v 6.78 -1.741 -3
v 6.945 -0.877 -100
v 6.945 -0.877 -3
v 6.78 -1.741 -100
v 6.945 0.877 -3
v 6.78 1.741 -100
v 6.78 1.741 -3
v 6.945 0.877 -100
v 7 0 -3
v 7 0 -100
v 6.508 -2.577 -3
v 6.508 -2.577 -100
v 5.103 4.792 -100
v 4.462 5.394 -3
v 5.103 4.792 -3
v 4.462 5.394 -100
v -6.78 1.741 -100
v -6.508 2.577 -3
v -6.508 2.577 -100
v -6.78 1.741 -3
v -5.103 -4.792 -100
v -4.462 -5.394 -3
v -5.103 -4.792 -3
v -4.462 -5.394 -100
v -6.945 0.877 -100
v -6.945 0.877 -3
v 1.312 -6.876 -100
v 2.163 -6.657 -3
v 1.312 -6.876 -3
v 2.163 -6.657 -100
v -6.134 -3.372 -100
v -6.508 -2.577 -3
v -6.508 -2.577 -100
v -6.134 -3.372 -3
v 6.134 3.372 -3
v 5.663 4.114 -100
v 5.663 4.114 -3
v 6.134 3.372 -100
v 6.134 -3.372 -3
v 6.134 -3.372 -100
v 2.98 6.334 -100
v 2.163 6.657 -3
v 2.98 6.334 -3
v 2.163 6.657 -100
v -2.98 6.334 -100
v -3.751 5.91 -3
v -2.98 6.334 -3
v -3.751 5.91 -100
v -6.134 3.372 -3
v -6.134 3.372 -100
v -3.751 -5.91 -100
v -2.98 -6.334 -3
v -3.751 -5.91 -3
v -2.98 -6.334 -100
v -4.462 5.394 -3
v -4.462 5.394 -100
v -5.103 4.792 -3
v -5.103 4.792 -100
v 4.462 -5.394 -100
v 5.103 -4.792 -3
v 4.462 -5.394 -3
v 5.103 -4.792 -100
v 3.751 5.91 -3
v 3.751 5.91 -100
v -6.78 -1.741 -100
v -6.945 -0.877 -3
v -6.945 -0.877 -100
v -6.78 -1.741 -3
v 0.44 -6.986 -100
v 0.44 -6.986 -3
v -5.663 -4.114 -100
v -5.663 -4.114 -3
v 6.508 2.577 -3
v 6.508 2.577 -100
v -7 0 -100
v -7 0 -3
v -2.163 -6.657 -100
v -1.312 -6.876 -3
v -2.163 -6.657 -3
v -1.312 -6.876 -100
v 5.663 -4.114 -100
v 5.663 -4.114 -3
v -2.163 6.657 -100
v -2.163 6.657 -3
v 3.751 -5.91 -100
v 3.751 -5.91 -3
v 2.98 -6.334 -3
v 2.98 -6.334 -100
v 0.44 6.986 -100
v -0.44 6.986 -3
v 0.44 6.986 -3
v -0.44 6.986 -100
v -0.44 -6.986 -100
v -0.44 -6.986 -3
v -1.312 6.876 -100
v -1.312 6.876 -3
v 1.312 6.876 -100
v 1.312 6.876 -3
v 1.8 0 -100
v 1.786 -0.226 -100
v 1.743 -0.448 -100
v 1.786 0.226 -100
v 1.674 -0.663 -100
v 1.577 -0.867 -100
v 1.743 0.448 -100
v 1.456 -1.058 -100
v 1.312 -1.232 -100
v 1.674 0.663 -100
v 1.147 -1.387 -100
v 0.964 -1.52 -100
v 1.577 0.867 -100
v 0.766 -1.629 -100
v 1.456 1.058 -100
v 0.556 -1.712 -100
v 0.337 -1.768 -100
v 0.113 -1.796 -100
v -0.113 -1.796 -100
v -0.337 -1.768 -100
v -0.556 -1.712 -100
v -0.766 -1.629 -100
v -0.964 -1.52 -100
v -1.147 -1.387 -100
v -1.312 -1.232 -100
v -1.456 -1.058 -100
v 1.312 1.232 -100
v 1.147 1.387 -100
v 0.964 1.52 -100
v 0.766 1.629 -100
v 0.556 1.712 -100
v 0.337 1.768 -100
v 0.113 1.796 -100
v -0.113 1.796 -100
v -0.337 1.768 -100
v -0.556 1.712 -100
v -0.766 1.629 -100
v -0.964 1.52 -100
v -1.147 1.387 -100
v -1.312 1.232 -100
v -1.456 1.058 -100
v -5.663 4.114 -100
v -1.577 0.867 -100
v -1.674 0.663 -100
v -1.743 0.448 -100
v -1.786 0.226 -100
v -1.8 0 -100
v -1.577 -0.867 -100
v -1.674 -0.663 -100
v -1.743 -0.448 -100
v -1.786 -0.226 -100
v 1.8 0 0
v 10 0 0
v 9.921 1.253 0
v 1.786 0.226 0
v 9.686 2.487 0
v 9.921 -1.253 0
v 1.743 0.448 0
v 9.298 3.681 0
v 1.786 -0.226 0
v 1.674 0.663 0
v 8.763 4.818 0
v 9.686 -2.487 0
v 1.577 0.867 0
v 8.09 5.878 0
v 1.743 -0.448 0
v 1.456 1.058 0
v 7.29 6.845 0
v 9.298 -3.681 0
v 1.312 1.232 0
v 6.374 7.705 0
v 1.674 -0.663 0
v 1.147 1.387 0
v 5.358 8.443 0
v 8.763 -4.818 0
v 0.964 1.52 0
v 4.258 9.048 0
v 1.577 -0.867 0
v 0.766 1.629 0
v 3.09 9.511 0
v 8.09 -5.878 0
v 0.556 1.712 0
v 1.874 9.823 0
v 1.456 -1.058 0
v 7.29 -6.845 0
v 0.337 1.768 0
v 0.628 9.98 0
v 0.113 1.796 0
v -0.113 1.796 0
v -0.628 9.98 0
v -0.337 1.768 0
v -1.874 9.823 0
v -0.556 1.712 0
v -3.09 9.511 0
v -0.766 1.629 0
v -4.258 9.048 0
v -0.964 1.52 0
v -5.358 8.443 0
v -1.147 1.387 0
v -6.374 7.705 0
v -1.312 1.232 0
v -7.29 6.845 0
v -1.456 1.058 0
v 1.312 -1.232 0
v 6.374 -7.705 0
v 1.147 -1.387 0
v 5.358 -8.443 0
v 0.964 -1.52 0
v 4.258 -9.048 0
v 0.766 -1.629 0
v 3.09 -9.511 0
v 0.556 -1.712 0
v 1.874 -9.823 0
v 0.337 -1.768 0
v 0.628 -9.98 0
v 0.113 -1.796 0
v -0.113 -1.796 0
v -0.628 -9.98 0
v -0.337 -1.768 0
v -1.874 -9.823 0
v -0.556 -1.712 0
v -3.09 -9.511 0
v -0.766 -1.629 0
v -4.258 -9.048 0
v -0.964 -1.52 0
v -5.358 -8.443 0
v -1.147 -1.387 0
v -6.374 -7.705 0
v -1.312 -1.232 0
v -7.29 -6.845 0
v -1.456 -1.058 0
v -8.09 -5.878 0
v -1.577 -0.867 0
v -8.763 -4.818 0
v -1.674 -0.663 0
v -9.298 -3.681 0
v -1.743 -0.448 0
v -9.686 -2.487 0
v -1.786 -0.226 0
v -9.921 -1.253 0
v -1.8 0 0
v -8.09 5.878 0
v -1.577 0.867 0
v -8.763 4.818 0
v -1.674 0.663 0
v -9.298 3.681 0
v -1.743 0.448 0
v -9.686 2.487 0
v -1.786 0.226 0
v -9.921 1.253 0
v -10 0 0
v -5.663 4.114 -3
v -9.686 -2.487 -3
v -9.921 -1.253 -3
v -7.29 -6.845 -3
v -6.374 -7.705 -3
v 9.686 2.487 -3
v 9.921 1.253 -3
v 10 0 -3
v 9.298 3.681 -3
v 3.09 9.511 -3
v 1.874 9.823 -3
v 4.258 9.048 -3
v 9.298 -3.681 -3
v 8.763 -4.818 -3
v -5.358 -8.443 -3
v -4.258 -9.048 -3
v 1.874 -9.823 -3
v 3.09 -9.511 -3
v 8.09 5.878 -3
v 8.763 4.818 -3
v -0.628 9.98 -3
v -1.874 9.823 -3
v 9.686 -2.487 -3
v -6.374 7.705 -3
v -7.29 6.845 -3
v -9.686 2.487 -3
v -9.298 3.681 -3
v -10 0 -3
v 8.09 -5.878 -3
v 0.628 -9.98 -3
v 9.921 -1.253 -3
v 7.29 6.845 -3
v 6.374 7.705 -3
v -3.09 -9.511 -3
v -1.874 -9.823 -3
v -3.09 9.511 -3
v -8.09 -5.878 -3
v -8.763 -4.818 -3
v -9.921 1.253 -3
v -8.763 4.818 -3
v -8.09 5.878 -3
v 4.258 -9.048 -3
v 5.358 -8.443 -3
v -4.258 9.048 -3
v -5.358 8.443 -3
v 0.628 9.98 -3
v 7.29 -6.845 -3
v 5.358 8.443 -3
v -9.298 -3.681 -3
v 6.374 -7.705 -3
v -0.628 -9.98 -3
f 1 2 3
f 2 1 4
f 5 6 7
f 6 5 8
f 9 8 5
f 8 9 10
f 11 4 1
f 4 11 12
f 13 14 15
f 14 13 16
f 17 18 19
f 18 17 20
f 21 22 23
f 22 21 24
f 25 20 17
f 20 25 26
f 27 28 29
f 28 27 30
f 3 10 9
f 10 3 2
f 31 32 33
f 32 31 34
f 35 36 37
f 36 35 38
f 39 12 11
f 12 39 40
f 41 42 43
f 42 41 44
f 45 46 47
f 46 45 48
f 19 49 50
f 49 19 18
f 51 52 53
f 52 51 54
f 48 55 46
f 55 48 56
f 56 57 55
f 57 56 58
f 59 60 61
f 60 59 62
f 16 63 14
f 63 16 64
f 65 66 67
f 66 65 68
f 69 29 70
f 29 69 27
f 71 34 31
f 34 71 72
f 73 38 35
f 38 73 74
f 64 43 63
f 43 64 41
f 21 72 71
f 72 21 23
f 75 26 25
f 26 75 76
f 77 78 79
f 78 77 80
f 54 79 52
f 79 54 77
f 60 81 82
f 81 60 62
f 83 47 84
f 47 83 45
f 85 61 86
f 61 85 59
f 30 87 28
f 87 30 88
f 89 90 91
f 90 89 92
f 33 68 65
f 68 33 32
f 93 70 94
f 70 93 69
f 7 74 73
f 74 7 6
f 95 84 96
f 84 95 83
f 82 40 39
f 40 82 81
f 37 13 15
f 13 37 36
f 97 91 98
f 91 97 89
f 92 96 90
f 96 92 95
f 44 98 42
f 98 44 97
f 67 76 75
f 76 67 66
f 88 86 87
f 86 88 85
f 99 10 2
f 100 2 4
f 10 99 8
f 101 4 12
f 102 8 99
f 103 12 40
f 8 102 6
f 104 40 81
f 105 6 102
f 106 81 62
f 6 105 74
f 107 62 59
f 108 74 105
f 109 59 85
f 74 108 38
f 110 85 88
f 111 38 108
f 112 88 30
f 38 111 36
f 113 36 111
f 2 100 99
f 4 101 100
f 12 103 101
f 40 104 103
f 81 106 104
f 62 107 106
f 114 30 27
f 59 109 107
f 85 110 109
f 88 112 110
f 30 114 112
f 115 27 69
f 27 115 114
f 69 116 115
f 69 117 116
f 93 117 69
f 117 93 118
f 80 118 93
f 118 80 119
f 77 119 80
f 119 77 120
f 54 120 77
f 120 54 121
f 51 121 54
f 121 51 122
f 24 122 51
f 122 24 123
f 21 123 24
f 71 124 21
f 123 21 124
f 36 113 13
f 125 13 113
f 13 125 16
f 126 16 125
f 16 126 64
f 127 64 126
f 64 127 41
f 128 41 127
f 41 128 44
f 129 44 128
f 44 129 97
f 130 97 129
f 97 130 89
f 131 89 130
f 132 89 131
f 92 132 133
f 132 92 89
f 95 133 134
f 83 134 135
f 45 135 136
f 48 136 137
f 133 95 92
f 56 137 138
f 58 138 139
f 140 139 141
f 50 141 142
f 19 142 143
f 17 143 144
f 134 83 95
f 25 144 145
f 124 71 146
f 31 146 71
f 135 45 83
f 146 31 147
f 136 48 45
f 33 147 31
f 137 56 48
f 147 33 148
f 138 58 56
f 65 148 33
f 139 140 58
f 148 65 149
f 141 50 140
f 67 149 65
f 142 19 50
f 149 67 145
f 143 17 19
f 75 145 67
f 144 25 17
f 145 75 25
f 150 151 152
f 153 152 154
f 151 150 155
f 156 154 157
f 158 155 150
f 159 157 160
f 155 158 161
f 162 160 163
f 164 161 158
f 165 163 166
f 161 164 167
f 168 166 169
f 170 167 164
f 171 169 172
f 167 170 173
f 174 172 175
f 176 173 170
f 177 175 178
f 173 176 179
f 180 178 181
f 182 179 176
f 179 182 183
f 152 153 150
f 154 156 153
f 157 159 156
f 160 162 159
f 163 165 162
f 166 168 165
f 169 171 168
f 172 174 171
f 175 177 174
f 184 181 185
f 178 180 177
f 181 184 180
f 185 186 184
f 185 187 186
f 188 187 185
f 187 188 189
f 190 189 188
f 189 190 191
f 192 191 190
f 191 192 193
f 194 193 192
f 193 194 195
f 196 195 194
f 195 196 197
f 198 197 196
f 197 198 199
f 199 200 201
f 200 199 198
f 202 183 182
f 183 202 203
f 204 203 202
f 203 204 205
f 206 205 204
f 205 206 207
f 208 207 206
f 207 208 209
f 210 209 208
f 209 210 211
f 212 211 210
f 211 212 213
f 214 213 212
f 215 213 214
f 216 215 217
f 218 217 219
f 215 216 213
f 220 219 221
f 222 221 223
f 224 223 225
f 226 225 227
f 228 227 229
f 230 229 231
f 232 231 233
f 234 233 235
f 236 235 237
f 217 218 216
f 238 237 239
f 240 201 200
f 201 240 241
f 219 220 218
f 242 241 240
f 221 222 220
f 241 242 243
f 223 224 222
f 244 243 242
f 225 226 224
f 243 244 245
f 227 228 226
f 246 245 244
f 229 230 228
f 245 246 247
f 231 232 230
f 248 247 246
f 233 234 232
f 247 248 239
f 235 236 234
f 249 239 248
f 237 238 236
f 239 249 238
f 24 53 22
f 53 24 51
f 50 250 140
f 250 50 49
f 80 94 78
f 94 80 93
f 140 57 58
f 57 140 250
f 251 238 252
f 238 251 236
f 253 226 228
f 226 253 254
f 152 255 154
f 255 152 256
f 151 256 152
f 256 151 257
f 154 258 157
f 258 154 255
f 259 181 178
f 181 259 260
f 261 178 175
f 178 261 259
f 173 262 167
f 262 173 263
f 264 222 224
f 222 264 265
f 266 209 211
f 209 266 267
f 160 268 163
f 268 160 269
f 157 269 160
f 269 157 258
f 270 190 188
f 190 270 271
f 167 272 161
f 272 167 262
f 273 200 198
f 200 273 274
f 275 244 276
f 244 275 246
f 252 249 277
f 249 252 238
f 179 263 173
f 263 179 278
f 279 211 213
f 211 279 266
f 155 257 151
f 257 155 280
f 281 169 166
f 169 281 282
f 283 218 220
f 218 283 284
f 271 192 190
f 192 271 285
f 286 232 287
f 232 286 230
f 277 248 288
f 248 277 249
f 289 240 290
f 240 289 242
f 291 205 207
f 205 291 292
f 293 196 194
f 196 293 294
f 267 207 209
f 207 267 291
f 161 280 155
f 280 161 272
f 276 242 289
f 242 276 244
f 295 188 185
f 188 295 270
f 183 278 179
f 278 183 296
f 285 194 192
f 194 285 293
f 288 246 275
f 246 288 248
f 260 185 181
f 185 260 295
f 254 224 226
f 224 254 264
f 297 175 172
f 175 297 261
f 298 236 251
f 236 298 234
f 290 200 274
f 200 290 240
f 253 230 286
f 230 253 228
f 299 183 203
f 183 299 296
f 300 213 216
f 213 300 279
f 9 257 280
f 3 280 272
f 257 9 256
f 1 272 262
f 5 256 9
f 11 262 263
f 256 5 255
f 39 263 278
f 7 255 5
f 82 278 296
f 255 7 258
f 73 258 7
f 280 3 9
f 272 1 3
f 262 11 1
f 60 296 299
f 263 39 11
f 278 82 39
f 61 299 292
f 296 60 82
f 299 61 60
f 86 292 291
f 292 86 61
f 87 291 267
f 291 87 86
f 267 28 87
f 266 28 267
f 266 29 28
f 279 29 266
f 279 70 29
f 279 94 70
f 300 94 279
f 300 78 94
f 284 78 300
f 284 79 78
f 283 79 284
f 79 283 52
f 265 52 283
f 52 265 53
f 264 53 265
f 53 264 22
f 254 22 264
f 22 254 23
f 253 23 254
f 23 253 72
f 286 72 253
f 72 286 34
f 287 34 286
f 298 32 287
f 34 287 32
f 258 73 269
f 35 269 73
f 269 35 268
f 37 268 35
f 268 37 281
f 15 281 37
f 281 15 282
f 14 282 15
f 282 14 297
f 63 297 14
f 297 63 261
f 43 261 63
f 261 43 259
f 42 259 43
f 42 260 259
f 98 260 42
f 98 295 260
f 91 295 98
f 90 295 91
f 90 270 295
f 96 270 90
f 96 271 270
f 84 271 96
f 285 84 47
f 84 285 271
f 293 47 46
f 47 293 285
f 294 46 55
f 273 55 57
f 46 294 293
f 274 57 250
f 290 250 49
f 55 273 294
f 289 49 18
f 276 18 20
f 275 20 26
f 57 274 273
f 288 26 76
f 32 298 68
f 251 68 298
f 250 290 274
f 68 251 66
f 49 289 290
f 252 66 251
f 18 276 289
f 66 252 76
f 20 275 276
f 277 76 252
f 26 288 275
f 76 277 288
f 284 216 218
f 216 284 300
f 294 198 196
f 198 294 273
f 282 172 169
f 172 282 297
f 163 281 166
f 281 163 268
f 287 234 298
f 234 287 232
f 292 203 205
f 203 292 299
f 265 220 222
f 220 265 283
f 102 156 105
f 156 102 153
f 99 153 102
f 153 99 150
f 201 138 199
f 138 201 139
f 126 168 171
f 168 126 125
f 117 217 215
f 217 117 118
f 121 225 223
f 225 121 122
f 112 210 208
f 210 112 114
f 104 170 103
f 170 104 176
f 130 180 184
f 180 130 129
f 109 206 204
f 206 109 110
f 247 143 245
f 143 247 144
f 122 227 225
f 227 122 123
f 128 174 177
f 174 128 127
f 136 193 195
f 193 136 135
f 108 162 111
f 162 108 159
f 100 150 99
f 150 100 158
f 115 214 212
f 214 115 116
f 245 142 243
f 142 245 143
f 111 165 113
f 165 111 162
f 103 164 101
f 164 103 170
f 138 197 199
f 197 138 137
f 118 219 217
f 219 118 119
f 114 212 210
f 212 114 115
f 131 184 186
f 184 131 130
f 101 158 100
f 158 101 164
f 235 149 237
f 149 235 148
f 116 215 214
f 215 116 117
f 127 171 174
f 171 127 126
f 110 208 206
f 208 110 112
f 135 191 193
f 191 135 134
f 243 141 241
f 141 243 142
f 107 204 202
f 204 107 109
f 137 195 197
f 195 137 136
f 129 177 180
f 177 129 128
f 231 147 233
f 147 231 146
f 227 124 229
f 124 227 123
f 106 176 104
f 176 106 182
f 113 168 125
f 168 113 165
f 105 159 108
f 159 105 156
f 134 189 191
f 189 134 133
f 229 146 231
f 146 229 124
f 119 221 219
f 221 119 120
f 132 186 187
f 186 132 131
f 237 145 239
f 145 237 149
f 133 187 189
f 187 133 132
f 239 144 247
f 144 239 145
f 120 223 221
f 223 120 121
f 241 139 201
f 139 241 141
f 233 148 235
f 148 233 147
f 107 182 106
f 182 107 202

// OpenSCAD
$fn = 50;


difference() {
	union() {
		translate(v = [0, 0, -100.0000000000]) {
			cylinder(h = 100, r = 7.0000000000);
		}
		translate(v = [0, 0, -3.0000000000]) {
			cylinder(h = 3, r = 10.0000000000);
		}
	}
	union() {
		#translate(v = [0, 0, -100]) {
			cylinder(h = 100, r = 1.8000000000);
		}
	}
}
